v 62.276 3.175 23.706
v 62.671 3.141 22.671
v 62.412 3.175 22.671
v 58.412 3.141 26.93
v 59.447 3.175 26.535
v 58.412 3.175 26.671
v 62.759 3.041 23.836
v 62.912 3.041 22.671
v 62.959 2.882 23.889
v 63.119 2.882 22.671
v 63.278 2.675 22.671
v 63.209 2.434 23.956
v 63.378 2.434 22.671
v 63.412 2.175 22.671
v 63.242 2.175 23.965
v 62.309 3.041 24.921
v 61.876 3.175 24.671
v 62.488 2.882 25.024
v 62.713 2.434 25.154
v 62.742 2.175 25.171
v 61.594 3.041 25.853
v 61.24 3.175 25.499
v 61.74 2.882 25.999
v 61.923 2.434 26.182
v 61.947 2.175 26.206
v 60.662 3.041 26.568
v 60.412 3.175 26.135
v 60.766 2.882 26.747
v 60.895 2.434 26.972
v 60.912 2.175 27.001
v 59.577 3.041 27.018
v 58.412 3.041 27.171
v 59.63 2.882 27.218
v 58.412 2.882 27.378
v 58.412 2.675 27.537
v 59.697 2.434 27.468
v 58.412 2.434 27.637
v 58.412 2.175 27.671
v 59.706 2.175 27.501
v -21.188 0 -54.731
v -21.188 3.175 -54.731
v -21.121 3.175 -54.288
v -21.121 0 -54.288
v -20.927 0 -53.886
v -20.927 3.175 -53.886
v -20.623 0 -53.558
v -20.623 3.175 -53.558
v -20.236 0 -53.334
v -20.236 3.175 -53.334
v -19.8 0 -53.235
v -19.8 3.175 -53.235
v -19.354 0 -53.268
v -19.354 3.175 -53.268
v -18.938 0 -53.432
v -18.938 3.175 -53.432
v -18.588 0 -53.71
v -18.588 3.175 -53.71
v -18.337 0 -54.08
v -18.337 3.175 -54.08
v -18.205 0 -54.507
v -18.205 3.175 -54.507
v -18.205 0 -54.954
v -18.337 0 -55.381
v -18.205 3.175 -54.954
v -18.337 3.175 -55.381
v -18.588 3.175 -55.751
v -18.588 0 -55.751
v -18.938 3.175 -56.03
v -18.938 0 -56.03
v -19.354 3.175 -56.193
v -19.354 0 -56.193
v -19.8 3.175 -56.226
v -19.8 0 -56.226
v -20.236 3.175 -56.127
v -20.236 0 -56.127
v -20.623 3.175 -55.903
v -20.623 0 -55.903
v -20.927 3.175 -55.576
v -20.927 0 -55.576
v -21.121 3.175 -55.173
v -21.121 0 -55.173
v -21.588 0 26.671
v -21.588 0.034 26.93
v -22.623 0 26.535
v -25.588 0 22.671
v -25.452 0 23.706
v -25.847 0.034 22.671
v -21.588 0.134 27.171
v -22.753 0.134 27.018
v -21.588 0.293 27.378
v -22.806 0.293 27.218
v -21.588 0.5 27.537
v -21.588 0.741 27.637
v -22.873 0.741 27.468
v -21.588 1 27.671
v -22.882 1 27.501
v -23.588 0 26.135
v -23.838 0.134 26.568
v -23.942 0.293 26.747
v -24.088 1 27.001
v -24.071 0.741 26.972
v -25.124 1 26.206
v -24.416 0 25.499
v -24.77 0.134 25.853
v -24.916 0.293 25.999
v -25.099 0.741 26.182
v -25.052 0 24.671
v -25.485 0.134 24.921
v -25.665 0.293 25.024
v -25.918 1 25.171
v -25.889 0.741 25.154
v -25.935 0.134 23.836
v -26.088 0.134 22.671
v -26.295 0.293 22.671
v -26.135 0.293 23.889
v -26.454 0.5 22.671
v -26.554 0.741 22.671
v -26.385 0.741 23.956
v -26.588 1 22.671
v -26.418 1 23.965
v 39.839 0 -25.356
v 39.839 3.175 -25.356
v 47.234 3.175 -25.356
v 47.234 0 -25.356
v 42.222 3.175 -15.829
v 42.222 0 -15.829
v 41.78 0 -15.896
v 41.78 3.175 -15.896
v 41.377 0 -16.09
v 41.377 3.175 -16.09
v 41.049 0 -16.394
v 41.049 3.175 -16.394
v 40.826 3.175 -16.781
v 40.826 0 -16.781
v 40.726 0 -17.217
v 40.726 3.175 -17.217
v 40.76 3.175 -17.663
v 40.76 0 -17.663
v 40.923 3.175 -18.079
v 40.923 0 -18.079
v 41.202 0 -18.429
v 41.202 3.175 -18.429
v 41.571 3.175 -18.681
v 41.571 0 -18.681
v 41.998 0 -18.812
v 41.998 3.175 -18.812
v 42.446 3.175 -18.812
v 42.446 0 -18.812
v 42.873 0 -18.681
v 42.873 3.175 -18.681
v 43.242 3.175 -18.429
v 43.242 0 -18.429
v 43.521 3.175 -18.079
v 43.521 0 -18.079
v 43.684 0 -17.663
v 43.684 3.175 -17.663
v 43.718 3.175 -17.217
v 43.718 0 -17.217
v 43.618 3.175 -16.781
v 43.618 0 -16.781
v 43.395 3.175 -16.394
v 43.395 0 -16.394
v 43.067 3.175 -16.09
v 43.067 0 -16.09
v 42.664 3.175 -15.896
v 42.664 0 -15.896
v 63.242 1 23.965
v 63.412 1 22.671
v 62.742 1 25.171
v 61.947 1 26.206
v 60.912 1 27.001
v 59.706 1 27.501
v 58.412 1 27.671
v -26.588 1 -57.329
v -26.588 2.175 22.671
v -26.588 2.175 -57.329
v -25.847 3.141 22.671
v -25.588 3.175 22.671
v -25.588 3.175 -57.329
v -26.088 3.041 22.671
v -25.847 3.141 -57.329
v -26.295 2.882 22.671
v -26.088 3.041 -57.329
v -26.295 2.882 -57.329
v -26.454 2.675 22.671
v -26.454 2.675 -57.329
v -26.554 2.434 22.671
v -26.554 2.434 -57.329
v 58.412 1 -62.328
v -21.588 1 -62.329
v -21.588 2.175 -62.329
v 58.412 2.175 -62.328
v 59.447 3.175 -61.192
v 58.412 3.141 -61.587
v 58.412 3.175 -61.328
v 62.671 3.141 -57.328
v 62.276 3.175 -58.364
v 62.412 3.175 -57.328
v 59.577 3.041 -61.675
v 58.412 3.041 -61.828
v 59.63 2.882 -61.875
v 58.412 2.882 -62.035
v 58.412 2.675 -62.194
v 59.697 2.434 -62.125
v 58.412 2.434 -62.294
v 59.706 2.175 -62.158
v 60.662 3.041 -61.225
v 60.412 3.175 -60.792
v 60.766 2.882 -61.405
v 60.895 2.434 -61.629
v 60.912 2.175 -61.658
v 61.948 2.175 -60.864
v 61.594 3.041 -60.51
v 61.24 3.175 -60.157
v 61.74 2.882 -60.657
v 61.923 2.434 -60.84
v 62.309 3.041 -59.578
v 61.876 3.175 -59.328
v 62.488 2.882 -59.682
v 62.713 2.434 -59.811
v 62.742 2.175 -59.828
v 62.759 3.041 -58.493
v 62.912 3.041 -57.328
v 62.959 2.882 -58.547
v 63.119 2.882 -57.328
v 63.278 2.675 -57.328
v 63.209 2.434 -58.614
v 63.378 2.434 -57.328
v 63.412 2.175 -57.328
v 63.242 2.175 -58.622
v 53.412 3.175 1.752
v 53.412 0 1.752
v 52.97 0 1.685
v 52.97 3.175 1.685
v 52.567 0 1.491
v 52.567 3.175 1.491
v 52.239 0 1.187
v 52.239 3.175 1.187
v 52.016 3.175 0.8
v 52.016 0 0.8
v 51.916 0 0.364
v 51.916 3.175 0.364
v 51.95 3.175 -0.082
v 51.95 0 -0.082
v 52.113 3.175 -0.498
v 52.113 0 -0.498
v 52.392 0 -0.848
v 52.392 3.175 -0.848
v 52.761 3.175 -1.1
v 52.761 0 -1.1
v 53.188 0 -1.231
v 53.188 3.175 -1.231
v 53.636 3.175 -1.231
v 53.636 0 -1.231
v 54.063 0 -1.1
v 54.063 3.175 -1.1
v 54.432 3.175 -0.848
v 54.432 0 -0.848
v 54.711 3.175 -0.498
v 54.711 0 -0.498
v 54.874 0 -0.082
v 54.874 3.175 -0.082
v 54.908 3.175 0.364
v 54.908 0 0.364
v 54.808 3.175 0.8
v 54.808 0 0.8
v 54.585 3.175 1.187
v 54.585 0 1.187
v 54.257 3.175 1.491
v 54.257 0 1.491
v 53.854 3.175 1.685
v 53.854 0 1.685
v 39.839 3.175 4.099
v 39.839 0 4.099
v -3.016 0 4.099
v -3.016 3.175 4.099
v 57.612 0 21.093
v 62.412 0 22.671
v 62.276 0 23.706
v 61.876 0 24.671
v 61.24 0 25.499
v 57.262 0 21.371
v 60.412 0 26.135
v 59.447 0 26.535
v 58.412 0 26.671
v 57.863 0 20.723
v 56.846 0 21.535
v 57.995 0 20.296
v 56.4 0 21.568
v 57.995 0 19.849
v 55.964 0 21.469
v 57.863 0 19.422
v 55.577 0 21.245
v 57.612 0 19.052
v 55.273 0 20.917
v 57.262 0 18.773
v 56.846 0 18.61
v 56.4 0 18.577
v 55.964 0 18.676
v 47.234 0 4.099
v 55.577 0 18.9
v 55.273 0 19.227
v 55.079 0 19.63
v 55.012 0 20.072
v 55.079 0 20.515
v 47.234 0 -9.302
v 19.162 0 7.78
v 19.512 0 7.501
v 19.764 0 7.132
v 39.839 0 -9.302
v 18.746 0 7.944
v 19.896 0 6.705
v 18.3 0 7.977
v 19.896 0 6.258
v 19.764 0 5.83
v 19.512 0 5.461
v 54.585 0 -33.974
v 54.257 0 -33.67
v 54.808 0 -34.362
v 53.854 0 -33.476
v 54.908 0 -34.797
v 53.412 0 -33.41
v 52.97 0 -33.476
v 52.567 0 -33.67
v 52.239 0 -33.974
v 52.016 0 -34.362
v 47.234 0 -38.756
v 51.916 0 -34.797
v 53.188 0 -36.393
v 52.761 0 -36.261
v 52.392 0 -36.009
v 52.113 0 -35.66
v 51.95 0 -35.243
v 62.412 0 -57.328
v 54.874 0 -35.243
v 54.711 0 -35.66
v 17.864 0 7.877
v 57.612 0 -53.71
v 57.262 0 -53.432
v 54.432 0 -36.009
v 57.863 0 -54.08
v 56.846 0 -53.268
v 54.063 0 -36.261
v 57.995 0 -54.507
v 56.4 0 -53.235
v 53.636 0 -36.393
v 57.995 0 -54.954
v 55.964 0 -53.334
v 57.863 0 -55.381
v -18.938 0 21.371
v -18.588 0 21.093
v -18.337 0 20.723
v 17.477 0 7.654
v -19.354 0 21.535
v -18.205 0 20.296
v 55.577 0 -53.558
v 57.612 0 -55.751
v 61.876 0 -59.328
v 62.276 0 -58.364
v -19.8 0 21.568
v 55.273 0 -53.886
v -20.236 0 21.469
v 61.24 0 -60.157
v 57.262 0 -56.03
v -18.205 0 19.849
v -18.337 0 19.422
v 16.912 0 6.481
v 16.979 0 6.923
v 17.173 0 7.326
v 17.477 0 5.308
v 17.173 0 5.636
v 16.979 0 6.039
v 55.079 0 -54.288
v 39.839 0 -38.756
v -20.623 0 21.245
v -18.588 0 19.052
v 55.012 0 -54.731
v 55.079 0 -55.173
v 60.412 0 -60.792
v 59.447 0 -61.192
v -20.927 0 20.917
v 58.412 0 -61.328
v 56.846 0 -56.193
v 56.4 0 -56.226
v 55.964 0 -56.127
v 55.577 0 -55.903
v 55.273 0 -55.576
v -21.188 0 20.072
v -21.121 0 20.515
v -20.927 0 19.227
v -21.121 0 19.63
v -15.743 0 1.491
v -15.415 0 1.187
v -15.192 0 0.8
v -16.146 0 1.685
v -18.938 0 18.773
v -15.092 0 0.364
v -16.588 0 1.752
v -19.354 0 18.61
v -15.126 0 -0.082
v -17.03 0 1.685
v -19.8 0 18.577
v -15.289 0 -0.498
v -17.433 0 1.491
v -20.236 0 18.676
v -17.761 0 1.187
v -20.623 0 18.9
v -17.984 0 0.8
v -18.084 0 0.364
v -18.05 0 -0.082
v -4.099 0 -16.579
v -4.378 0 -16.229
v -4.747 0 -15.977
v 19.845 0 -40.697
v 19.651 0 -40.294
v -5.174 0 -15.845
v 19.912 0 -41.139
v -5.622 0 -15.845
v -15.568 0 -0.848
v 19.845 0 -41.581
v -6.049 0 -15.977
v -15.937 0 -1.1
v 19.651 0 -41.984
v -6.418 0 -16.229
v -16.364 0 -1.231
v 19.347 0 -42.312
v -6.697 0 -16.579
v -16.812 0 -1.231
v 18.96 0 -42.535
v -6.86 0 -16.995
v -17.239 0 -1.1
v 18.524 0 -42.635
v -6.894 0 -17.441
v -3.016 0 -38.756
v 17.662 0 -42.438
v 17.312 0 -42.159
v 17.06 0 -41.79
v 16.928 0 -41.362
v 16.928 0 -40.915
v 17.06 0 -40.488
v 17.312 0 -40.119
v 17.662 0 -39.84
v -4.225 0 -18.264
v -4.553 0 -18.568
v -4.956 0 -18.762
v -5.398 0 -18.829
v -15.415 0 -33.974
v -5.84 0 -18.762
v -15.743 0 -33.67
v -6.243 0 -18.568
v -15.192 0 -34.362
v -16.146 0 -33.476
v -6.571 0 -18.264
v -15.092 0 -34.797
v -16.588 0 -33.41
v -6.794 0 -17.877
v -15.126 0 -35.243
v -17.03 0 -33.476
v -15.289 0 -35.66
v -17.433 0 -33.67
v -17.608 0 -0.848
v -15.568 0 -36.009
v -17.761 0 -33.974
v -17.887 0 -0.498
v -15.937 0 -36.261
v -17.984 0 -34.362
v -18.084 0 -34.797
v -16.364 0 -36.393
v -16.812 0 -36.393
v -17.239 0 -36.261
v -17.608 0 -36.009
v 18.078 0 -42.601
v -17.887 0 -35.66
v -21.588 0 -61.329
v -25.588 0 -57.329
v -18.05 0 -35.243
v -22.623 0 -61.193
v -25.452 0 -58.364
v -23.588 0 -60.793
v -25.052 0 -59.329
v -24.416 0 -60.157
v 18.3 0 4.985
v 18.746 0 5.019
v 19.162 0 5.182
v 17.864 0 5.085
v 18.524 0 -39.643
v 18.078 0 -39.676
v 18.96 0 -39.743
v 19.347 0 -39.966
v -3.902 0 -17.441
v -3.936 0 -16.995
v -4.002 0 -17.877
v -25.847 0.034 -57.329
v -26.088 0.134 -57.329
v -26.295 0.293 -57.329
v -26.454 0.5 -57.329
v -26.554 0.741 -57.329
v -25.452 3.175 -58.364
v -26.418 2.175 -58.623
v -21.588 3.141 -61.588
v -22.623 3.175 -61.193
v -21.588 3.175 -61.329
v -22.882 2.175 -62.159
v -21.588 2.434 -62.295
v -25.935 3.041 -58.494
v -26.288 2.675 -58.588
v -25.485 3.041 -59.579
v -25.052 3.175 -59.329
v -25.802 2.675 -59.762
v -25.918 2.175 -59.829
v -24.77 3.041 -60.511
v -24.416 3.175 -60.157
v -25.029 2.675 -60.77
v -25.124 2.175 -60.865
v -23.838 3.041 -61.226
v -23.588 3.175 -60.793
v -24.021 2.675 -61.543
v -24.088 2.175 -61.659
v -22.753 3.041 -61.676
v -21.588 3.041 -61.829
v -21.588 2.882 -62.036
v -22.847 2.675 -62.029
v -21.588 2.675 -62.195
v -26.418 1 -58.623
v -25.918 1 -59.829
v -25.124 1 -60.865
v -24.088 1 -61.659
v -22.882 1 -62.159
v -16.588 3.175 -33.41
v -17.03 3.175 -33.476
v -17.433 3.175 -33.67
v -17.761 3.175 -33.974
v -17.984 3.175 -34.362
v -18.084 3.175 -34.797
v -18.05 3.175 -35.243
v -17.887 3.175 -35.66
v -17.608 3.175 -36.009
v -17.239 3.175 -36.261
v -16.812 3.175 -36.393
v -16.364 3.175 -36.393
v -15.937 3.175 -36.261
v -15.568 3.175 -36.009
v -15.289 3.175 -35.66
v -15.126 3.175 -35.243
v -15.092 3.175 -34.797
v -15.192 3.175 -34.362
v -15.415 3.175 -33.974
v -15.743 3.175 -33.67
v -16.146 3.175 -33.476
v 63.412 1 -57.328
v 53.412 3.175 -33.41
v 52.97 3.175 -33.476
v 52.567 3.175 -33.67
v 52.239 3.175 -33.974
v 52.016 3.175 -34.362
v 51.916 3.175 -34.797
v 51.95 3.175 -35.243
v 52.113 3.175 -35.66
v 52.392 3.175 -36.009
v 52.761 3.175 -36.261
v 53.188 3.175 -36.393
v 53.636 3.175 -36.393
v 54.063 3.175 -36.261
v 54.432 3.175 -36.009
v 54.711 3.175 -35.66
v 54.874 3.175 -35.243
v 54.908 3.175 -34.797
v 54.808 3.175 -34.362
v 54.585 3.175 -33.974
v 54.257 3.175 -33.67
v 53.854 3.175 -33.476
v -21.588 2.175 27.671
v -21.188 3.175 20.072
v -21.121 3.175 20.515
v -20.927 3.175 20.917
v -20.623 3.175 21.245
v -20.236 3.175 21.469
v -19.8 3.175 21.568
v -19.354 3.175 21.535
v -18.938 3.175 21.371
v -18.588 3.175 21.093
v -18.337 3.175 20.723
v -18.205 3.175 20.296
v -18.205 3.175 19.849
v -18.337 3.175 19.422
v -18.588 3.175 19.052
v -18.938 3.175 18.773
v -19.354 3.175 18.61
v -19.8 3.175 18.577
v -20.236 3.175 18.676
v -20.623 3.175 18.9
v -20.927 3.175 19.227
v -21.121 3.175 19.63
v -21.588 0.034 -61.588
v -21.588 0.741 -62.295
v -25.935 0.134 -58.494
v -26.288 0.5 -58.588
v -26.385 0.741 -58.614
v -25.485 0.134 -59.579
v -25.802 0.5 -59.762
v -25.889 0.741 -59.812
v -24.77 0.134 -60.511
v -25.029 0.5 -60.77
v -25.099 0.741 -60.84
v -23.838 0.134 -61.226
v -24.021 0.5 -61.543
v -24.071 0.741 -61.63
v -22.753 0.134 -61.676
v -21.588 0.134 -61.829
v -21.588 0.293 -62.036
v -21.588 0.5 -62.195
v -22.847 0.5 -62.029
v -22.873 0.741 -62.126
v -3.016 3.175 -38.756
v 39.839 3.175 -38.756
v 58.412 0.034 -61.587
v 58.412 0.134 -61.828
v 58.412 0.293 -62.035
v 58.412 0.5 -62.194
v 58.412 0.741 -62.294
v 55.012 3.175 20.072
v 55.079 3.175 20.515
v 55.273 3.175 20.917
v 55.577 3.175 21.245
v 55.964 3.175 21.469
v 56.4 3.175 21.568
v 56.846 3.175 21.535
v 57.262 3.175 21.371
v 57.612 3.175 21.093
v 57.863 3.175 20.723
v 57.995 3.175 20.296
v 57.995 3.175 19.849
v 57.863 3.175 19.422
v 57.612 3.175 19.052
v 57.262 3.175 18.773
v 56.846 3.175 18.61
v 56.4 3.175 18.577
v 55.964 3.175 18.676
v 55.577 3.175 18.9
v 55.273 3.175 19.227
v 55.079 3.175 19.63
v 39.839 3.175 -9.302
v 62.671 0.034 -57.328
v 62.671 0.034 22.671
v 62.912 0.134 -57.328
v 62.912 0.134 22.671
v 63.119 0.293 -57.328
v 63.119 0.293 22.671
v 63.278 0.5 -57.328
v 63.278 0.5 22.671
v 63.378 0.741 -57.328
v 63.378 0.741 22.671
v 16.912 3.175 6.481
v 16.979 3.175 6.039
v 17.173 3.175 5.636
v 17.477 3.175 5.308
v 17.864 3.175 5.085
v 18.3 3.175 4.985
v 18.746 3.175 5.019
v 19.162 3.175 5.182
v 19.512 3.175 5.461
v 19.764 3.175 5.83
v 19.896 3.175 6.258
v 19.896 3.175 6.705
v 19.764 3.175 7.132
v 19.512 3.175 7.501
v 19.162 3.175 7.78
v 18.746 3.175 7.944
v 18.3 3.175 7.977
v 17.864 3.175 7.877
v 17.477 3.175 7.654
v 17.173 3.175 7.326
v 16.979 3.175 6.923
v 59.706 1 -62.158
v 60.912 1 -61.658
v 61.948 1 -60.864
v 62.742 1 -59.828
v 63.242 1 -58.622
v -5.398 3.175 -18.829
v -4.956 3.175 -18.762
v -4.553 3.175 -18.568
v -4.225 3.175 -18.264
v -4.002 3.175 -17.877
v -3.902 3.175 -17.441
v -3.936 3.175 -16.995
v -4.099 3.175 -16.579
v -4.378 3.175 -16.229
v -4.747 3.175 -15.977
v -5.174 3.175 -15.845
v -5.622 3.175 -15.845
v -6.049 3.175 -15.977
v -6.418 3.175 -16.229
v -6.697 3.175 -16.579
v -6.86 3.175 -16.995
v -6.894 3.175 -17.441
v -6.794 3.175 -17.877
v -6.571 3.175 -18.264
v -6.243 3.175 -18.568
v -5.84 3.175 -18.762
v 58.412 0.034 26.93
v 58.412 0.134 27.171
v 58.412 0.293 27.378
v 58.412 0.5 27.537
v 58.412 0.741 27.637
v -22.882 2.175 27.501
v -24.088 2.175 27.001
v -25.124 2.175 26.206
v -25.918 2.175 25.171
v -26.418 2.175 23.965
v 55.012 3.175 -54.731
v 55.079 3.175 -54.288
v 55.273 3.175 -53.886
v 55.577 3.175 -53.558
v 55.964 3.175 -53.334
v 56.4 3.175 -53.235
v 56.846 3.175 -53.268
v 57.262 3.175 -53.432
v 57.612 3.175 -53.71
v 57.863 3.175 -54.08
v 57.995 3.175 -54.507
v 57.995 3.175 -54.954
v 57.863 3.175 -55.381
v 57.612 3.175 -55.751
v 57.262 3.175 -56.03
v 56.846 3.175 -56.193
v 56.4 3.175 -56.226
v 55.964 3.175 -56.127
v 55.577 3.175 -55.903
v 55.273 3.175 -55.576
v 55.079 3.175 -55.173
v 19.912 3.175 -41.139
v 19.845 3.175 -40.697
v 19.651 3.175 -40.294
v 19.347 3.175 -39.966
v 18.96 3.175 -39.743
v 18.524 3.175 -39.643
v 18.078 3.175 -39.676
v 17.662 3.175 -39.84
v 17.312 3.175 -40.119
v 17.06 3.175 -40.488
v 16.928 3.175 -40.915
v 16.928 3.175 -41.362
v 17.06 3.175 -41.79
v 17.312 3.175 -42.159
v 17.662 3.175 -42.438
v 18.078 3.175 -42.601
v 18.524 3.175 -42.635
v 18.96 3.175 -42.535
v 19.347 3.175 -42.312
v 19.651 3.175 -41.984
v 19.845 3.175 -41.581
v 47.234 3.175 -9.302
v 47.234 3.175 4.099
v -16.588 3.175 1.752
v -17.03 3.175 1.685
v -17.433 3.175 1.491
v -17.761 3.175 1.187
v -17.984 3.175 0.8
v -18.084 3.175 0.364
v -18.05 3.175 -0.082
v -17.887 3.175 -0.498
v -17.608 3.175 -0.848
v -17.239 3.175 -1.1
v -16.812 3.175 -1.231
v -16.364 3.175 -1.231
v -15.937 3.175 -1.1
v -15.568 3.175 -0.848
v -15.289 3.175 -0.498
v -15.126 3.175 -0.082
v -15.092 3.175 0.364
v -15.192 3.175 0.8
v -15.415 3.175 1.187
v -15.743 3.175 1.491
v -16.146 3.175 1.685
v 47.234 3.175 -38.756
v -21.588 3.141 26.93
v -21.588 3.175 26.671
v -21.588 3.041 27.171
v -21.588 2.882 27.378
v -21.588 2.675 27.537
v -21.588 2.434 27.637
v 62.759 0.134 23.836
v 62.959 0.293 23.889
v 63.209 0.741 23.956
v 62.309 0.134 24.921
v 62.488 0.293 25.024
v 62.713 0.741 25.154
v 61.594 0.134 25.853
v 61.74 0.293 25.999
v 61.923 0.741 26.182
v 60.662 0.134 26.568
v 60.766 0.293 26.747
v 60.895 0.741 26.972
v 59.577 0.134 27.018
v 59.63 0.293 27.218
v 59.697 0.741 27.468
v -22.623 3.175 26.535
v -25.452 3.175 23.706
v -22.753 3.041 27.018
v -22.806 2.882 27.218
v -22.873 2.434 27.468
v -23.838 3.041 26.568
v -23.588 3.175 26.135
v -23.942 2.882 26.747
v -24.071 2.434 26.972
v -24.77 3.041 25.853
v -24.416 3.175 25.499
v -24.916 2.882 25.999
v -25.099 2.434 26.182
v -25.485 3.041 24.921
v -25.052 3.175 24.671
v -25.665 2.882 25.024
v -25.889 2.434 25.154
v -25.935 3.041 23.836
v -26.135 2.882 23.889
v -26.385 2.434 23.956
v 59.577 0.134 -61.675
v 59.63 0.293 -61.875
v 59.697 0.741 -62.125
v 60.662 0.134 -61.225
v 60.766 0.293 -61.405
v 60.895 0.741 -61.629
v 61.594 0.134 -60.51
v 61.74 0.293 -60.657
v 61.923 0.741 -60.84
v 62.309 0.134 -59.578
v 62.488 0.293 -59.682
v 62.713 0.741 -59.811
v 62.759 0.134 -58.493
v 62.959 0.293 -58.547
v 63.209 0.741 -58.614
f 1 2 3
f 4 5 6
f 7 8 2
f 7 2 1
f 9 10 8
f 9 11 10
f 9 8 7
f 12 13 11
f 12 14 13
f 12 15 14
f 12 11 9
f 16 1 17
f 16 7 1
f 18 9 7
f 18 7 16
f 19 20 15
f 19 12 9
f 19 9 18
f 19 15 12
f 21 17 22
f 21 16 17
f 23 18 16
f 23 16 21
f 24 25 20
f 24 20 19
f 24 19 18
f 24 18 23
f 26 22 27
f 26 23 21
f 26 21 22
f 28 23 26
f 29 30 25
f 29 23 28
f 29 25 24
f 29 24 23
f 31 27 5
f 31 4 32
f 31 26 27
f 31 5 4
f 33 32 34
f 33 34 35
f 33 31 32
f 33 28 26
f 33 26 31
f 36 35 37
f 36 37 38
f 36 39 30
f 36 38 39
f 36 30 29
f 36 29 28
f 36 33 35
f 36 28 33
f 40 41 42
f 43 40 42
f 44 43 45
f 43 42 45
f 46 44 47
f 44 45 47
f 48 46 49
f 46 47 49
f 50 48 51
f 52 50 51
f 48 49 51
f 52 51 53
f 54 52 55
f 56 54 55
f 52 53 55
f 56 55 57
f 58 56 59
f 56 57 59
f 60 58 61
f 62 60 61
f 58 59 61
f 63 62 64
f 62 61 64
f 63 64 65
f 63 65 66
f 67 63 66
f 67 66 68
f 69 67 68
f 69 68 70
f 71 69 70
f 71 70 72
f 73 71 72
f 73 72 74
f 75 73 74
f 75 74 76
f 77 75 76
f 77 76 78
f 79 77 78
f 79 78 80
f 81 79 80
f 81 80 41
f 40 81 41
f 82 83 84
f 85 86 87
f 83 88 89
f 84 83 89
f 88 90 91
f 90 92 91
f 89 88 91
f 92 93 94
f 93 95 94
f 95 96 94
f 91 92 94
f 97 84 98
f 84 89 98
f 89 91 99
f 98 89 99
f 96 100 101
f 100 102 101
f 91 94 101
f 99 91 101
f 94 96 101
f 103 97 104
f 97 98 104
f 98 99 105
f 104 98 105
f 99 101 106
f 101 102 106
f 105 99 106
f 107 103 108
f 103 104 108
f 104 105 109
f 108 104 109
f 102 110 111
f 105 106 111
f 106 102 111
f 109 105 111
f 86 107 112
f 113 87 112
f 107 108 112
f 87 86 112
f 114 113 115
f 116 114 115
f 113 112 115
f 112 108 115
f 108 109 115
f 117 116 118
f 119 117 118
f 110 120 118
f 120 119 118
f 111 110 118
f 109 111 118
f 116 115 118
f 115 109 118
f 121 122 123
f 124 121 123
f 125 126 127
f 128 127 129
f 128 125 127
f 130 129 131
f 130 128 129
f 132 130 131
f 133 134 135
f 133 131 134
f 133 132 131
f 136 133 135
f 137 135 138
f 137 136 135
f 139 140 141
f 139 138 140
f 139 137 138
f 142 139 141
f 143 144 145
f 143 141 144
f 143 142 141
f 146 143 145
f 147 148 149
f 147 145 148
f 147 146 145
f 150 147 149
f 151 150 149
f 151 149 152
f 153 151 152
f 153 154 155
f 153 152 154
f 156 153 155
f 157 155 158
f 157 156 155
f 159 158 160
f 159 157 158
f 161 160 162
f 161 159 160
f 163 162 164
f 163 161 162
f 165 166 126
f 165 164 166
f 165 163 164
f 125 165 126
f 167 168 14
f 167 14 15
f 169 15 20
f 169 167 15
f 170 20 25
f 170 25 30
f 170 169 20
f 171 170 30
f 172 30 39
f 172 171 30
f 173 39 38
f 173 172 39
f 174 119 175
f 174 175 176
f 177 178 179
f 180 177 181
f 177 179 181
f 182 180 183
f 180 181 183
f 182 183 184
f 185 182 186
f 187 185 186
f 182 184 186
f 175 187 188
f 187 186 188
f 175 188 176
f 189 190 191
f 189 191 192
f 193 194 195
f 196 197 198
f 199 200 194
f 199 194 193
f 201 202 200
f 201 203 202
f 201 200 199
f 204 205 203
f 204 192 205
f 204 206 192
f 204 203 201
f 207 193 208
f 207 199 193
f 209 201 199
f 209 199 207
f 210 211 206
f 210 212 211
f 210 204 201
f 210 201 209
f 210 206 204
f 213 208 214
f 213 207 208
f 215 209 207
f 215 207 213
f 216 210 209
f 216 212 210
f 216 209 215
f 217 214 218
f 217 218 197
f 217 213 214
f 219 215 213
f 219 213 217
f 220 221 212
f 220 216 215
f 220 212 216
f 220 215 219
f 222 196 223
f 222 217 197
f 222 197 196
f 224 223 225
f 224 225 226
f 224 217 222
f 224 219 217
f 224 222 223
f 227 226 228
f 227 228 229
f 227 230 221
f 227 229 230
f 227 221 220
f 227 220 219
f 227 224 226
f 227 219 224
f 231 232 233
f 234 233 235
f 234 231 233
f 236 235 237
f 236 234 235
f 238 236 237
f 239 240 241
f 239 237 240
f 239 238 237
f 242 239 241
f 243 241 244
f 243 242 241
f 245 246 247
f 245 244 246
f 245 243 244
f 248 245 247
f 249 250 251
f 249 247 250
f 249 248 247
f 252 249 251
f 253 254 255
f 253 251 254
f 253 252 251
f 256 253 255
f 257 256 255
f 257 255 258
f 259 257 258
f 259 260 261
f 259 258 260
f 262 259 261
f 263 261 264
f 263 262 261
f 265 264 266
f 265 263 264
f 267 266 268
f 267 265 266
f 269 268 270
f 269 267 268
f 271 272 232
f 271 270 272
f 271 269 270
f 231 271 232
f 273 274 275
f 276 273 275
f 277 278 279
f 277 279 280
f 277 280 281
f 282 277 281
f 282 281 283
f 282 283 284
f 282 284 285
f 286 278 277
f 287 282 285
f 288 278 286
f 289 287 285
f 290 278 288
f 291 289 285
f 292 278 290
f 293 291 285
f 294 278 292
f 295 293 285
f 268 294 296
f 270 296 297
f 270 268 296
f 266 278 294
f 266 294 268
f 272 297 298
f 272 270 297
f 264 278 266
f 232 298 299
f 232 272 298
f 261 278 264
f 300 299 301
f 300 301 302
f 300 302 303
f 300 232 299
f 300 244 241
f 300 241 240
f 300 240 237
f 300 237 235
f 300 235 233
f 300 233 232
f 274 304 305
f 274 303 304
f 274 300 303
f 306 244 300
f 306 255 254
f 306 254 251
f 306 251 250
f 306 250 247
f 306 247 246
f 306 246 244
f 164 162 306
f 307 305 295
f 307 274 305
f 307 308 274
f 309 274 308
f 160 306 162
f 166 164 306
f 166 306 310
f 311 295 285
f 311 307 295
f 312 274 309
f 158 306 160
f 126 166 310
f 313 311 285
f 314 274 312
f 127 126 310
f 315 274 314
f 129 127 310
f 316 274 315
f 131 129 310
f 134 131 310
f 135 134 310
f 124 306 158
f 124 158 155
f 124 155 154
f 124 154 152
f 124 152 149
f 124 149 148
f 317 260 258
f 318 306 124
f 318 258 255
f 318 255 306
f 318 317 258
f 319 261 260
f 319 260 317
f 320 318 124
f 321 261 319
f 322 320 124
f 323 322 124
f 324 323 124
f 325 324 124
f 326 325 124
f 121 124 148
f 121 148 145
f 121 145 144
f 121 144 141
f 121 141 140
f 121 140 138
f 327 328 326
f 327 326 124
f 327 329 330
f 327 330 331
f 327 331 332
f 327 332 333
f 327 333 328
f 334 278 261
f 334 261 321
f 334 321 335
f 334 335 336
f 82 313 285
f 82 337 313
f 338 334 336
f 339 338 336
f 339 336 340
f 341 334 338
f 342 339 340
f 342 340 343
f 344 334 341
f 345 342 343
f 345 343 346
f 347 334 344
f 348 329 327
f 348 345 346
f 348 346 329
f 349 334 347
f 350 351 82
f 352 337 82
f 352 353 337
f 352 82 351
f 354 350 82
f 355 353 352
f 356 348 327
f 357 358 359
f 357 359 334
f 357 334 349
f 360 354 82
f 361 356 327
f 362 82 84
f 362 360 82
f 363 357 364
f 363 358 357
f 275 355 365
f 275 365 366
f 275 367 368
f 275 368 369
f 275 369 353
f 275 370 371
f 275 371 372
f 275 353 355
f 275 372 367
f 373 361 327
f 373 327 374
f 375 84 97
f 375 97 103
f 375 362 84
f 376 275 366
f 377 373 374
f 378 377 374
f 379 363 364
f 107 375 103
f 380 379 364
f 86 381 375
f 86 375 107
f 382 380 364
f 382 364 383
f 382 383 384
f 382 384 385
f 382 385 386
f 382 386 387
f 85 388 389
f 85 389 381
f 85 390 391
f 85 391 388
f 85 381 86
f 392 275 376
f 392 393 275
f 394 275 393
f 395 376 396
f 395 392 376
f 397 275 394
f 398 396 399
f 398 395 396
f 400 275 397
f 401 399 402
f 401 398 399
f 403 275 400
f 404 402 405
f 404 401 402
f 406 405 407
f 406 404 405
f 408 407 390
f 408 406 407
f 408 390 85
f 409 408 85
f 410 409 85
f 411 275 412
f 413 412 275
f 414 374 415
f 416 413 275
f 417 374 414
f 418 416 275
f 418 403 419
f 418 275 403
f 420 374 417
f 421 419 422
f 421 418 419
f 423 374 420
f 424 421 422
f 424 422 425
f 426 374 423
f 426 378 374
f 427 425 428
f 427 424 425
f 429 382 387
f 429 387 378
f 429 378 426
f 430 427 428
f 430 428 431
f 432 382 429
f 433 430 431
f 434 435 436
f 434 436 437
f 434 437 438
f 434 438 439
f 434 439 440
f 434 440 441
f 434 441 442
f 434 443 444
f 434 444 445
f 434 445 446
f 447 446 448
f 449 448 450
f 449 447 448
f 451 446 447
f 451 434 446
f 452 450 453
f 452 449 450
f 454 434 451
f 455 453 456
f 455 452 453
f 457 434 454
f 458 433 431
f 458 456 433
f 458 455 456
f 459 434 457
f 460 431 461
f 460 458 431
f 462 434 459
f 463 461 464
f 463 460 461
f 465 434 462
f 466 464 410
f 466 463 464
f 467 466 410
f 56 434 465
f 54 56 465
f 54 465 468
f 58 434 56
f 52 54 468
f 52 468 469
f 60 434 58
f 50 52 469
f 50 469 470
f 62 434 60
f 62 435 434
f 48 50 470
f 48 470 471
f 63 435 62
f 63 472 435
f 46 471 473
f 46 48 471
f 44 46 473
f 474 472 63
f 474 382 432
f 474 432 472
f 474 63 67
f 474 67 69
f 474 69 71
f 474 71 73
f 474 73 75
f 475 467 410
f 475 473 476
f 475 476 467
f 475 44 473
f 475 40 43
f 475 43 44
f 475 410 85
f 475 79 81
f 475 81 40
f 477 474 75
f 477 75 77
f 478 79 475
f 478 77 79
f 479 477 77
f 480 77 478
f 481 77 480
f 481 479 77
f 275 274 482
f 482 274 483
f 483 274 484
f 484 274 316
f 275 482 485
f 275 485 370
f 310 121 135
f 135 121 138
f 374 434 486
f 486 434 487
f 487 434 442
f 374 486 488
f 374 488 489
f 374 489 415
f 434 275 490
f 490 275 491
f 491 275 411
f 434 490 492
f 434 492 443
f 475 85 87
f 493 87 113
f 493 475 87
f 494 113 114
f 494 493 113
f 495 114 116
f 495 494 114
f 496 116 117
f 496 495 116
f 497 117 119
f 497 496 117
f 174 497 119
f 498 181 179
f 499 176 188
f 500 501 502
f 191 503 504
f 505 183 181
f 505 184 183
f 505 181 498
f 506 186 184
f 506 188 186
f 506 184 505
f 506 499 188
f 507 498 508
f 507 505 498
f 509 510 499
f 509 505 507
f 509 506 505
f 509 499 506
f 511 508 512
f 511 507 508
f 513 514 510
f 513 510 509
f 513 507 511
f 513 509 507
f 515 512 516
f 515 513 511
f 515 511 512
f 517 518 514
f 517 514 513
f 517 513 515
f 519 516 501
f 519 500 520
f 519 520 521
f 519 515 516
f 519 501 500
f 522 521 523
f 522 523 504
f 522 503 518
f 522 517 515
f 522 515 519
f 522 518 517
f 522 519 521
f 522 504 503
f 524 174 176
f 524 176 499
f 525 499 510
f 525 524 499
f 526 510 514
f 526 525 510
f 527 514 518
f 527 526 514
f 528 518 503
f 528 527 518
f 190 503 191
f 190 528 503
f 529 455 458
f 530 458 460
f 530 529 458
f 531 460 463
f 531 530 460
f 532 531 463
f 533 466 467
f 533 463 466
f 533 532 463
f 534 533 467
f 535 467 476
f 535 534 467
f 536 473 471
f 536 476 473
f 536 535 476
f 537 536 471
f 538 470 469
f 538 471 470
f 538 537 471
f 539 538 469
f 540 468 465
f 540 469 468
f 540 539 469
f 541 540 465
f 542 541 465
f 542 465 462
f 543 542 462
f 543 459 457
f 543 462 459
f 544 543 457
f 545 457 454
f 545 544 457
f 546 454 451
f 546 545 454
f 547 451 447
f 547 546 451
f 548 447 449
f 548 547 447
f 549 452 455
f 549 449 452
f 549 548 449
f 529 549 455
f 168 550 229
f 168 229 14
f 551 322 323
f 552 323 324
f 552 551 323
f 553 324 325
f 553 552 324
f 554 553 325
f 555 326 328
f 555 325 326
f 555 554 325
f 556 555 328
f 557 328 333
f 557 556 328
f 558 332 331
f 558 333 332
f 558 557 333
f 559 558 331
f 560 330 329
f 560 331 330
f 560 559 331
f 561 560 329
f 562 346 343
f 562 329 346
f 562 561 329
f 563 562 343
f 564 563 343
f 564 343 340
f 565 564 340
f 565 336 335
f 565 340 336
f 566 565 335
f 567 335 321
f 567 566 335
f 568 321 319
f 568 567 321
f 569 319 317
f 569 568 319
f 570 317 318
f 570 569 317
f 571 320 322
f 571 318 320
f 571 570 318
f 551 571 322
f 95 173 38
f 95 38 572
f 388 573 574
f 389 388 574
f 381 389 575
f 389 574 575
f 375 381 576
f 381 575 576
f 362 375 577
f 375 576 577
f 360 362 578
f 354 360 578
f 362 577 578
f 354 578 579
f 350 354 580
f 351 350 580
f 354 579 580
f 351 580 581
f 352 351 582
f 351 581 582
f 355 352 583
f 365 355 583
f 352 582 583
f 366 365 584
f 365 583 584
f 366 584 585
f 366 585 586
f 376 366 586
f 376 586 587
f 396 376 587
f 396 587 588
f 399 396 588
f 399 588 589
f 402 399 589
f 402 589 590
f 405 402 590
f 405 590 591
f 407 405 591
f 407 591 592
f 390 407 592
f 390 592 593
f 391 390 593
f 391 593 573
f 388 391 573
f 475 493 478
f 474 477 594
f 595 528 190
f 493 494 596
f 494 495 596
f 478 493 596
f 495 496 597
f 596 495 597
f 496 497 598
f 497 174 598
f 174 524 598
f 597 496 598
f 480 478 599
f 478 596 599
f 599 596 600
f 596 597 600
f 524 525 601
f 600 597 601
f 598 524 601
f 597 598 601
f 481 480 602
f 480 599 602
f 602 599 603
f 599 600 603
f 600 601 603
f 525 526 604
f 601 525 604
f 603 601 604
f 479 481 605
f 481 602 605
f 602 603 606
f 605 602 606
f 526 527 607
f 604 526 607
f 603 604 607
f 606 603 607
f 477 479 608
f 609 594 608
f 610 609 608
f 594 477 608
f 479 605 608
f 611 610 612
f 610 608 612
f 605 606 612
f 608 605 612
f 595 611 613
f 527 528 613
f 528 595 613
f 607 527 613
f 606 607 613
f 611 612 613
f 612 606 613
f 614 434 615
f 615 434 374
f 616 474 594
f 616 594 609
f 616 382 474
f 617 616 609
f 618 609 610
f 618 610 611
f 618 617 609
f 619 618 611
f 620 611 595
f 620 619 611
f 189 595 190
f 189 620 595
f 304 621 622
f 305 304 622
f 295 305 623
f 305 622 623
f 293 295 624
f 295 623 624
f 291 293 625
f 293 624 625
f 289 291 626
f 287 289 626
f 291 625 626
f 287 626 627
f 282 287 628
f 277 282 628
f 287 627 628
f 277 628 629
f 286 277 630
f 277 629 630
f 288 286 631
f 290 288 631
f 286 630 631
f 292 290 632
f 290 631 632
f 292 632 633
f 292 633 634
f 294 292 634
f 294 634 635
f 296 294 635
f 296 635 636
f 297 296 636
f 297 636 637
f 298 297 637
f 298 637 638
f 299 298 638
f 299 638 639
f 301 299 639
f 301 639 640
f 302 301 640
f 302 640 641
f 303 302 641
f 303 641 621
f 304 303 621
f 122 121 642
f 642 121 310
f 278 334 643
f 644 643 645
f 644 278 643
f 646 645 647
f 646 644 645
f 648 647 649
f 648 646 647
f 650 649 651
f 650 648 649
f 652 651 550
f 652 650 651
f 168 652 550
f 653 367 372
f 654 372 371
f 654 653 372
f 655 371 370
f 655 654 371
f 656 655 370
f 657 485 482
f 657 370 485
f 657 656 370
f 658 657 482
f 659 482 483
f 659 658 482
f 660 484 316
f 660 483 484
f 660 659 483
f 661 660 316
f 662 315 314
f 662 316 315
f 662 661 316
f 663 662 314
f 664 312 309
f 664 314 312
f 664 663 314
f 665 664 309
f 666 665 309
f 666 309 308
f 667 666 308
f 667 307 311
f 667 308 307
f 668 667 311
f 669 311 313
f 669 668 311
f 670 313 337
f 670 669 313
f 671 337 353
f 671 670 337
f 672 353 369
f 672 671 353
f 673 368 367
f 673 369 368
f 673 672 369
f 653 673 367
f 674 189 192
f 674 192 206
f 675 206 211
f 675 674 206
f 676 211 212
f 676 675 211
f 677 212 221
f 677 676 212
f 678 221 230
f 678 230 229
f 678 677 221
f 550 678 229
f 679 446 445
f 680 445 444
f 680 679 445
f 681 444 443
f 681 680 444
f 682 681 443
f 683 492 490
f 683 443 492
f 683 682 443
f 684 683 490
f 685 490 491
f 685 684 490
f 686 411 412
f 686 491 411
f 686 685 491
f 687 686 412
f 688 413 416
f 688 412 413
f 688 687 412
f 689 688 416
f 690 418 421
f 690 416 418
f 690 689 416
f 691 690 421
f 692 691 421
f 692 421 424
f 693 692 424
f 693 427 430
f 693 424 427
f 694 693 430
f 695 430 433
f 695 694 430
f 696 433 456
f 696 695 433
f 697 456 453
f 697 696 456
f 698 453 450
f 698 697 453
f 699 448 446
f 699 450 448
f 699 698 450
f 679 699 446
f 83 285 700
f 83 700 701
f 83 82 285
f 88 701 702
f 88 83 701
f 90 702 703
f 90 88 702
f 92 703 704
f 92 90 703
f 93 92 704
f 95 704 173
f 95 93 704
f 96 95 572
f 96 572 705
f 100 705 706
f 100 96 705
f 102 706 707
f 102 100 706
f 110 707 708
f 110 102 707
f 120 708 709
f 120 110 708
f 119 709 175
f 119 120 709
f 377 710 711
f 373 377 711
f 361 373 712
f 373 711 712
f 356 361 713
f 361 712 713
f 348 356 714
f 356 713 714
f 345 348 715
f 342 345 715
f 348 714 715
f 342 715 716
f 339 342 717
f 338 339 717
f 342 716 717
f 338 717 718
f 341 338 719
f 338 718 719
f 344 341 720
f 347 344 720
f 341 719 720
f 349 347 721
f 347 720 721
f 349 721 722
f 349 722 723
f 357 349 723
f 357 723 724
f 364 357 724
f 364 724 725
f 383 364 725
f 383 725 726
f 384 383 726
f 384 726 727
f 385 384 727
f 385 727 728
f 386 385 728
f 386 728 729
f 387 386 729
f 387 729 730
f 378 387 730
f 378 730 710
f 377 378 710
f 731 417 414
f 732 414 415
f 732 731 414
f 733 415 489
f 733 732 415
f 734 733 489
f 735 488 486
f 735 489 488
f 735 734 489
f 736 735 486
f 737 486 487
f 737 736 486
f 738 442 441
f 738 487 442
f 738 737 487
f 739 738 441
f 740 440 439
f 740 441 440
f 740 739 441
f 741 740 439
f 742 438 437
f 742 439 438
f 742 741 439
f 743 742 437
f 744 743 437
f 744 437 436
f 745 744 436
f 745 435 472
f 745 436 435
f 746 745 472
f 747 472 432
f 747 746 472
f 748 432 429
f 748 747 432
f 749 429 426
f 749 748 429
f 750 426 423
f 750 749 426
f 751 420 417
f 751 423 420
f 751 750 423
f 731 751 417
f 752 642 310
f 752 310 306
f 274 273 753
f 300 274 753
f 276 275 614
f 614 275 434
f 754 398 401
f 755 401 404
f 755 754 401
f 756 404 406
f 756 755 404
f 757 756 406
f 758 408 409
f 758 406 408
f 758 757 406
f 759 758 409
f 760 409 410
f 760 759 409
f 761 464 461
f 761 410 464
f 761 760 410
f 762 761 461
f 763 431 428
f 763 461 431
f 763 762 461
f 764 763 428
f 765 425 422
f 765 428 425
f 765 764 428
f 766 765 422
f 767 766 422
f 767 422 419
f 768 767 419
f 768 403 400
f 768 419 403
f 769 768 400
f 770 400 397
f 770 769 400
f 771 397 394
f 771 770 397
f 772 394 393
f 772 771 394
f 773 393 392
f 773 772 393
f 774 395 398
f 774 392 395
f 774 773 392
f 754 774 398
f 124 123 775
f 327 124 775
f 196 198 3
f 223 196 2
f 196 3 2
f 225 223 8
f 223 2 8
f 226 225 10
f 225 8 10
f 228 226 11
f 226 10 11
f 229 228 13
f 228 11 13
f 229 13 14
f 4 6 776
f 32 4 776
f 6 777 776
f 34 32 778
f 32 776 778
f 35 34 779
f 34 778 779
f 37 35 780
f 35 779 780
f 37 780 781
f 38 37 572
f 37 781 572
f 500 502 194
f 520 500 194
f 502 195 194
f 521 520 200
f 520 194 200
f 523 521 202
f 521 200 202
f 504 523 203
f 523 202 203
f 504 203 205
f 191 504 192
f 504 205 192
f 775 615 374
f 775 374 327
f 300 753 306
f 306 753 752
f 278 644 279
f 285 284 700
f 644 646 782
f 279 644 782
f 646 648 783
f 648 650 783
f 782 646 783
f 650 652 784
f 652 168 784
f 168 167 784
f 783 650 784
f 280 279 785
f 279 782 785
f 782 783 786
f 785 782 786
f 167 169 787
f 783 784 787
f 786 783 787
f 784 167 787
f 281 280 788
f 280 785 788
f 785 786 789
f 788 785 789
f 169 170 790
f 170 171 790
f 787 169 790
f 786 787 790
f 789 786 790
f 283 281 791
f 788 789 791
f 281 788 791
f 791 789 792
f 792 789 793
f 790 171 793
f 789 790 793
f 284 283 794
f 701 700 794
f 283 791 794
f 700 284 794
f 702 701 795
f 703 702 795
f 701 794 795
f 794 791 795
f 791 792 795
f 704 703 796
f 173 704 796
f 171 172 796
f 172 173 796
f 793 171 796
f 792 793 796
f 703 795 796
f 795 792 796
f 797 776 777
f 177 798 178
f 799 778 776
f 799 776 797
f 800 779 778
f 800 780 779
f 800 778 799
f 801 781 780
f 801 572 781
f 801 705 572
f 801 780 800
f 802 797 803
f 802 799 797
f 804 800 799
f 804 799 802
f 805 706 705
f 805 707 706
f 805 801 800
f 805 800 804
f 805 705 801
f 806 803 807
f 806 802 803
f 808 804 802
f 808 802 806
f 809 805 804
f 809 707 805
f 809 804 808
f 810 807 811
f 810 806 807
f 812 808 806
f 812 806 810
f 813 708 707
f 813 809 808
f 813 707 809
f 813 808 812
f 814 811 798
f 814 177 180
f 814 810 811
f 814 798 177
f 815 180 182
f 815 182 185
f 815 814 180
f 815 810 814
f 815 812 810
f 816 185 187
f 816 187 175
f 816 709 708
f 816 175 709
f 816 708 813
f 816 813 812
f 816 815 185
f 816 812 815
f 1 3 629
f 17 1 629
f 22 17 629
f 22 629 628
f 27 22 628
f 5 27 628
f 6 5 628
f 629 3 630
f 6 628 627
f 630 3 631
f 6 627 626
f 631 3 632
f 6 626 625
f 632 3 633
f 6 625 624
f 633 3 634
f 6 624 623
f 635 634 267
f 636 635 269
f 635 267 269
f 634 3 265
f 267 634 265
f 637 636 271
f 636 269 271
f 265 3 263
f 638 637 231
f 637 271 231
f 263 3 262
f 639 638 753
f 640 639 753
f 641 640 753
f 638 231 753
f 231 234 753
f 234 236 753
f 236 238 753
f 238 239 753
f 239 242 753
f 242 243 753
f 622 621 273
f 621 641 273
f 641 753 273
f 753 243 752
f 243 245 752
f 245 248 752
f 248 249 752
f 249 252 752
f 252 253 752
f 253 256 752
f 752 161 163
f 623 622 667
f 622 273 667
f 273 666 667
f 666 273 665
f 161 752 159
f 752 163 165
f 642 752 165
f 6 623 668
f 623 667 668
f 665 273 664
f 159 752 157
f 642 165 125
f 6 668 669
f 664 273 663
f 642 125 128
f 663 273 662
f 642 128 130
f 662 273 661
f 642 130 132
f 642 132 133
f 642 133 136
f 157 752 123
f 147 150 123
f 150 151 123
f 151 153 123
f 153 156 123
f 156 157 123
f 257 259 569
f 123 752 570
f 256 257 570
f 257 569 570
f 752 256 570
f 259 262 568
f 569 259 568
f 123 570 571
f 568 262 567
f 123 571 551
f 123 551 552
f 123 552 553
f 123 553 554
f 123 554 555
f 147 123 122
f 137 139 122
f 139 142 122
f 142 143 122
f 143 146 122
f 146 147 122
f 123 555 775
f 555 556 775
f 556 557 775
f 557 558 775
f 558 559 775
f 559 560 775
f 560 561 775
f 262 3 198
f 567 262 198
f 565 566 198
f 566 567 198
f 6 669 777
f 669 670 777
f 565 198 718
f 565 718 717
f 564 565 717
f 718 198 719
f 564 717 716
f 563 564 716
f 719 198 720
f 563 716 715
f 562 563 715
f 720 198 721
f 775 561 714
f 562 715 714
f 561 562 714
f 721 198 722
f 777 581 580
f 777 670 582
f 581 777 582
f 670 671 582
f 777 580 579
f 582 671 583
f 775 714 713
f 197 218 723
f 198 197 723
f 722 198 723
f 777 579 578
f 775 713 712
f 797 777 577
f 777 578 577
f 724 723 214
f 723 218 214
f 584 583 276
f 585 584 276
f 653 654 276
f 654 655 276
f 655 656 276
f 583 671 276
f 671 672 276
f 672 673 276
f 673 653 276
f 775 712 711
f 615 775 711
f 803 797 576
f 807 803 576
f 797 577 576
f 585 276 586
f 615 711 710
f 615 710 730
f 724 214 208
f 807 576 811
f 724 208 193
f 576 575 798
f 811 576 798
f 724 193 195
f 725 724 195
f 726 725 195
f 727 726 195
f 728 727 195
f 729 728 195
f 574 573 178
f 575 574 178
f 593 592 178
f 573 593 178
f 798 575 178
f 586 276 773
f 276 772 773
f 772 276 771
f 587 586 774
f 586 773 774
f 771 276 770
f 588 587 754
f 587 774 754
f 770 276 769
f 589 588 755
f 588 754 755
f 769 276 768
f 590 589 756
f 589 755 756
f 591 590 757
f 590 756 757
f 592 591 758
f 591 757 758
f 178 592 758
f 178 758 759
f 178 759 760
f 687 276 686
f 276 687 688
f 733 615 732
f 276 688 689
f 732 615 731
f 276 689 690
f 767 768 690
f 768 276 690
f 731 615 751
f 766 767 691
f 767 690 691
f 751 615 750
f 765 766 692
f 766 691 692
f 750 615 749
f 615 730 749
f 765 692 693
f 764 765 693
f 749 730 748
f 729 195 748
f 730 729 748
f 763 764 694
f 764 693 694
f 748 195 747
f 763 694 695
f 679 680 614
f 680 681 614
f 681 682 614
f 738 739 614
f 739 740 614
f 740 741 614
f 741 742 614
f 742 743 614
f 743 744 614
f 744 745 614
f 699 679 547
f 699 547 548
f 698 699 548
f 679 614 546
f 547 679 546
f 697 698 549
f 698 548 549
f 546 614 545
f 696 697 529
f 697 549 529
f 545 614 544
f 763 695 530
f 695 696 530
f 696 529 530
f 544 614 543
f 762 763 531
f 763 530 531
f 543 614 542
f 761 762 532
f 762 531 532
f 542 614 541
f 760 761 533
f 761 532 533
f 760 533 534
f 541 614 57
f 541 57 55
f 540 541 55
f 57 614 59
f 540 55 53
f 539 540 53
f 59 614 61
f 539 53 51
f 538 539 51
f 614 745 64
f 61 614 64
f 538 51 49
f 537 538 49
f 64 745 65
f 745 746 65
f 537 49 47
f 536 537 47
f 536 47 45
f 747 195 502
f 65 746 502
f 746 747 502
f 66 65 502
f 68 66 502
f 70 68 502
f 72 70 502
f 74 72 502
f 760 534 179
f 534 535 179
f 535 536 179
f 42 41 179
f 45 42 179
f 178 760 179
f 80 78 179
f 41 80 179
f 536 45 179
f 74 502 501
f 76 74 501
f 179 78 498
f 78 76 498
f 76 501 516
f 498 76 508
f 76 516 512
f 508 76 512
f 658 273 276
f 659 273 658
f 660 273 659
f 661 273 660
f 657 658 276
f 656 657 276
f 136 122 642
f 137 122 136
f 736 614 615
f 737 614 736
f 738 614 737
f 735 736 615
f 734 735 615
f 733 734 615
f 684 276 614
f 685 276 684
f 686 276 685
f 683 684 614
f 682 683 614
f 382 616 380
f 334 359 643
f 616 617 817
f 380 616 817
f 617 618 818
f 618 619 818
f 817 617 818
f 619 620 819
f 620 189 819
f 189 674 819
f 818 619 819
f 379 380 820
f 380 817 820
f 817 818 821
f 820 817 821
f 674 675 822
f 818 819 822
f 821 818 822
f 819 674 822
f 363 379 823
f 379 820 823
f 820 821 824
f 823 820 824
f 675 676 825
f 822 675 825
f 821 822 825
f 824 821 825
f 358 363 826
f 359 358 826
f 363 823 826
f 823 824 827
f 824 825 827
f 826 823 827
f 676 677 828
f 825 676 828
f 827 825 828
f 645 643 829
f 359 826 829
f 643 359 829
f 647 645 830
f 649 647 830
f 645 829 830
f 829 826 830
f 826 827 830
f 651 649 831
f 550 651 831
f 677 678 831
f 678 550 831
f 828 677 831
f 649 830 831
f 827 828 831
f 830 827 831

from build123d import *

# Parameters (mm, degrees)
ALUMINUM_PLATE_DEPTH         = 3.175
SKETCH5_W                    = 7.394678559
SKETCH5_H                    = 13.40037918
SKETCH5_H_2                  = 13.400379181
CUT_EXTRUDE18_DEPTH          = 3.175
LPATTERN1_COUNT              = 2
LPATTERN1_PITCH              = 70
LPATTERN1_COUNT_DIR2         = 2
LPATTERN1_PITCH_DIR2         = 35.16147
CIRPATTERN1_COUNT            = 4
F_3_0_3_DIAMETER_HOLE5_D     = 3
F_3_0_3_DIAMETER_HOLE5_DEPTH = 25.4
F_3_0_3_DIAMETER_HOLE5_TIP   = 0.901290929
FILLET1_R                    = 1


with BuildPart() as part:
    # Sketch2 → Aluminum plate (new body)
    with BuildSketch(Plane(origin=(0, 0, 0), x_dir=(1, 0, 0), z_dir=(0, 1, 0))):
        with BuildLine():
            Line((58.411953225, -27.670918752), (-21.588046771, -27.670918749))
            ThreePointArc((-21.588046771, -27.670918749), (-25.123580677, -26.206452654), (-26.588046771, -22.670918748))
            Line((-26.588046771, -22.670918748), (-26.588046767, 57.329032922))
            ThreePointArc((-26.588046767, 57.329032922), (-25.123563586, 60.864583915), (-21.587998438, 62.329032922))
            Line((-21.587998438, 62.329032922), (58.412001558, 62.328259655))
            ThreePointArc((58.412001558, 62.328259655), (61.947504222, 60.863776475), (63.411953229, 57.328259655))
            Line((63.411953229, 57.328259655), (63.411953225, -22.670918752))
            ThreePointArc((63.411953225, -22.670918752), (61.947487131, -26.206452658), (58.411953225, -27.670918752))
        make_face()
        Polygon((39.839453224, -4.0986466), (-3.015546772, -4.098646598), (-3.01554677, 38.756353402), (39.83945323, 38.7563534), align=None, mode=Mode.SUBTRACT)
    extrude(amount=ALUMINUM_PLATE_DEPTH)

    # Sketch5 → Cut-Extrude18 (cut)
    with BuildSketch(Plane(origin=(0, 3.175, 0), x_dir=(1, 0, 0), z_dir=(0, 1, 0))):
        with Locations((43.53679251, 2.60154299)):
            Rectangle(SKETCH5_W, SKETCH5_H)
        with Locations((43.53679251, 32.056163809)):
            Rectangle(SKETCH5_W, SKETCH5_H_2)
    extrude(amount=-CUT_EXTRUDE18_DEPTH, mode=Mode.SUBTRACT)

    # Sketch12 → Ø3.0 (3) Diameter Hole3 (revolve, cut)
    with BuildSketch(Plane(origin=(-16.588046767, 3.175, -34.909587365), x_dir=(0, 0, 1), z_dir=(1, 0, 0))):
        Polygon((0, 0), (0, 26.301290929), (1.5, 25.4), (1.5, 0), align=None)
    f_3_0_3_diameter_hole3 = revolve(axis=Axis((-16.588046767, 9.525, -34.909587365), (0, -1, 0)), mode=Mode.SUBTRACT)

    # LPattern1: 3.0 _3_ Diameter Hole3 2 × 2
    with Locations(*[(i * LPATTERN1_PITCH, 0, j * LPATTERN1_PITCH_DIR2) for i in range(LPATTERN1_COUNT) for j in range(LPATTERN1_COUNT_DIR2) if (i, j) != (0, 0)]):
        add(f_3_0_3_diameter_hole3, mode=Mode.SUBTRACT)

    # Sketch14 → Ø3.0 (3) Diameter Hole4 (revolve, cut)
    with BuildSketch(Plane(origin=(42.221953226, 3.175, -17.329161252), x_dir=(0, 0, 1), z_dir=(1, 0, 0))):
        Polygon((0, 0), (0, 26.301290929), (1.5, 25.4), (1.5, 0), align=None)
    f_3_0_3_diameter_hole4 = revolve(axis=Axis((42.221953226, 9.525, -17.329161252), (0, -1, 0)), mode=Mode.SUBTRACT)

    # CirPattern1: Ø3.0 (3) Diameter Hole4 ×4 about axis
    cirpattern1_axis = Axis((18.411953227, 48.172334768, -17.328853403), (0, -1, 0))
    for i in range(1, CIRPATTERN1_COUNT):
        add(f_3_0_3_diameter_hole4.rotate(cirpattern1_axis, i * 360 / CIRPATTERN1_COUNT), mode=Mode.SUBTRACT)

    # Ø3.0 (3) Diameter Hole5
    with Locations(Plane.XZ):
        with Locations((-19.688046767, -54.730581251), (56.511953233, -54.730581251), (56.511953233, 20.072418749), (-19.688046767, 20.072418749)):
            Hole(F_3_0_3_DIAMETER_HOLE5_D / 2, depth=F_3_0_3_DIAMETER_HOLE5_DEPTH)
            with Locations((0, 0, -(F_3_0_3_DIAMETER_HOLE5_DEPTH + F_3_0_3_DIAMETER_HOLE5_TIP / 2))):  # 118° drill point
                Cone(0, F_3_0_3_DIAMETER_HOLE5_D / 2, F_3_0_3_DIAMETER_HOLE5_TIP, mode=Mode.SUBTRACT)

    # Fillet1
    fillet1_edges = [part.edges().sort_by_distance(p)[0] for p in [
        (-25.123580677, 0, 26.206452654),
        (-26.588046769, 0, -17.329057087),
        (-25.123563586, 0, -60.864583915),
        (18.41200156, 0, -62.328646289),
        (61.947504222, 0, -60.863776475),
        (63.411953227, 0, -17.328670452),
        (61.947487131, 0, 26.206452658),
        (61.947504222, 3.175, -60.863776475),
        (63.411953227, 3.175, -17.328670452),
        (61.947487131, 3.175, 26.206452658),
        (18.411953227, 3.175, 27.67091875),
        (-25.123580677, 3.175, 26.206452654),
        (-26.588046769, 3.175, -17.329057087),
        (-25.123563586, 3.175, -60.864583915),
        (18.411953227, 0, 27.67091875),
        (18.41200156, 3.175, -62.328646289),
    ]]
    fillet(fillet1_edges, radius=FILLET1_R)


solid = part.part
